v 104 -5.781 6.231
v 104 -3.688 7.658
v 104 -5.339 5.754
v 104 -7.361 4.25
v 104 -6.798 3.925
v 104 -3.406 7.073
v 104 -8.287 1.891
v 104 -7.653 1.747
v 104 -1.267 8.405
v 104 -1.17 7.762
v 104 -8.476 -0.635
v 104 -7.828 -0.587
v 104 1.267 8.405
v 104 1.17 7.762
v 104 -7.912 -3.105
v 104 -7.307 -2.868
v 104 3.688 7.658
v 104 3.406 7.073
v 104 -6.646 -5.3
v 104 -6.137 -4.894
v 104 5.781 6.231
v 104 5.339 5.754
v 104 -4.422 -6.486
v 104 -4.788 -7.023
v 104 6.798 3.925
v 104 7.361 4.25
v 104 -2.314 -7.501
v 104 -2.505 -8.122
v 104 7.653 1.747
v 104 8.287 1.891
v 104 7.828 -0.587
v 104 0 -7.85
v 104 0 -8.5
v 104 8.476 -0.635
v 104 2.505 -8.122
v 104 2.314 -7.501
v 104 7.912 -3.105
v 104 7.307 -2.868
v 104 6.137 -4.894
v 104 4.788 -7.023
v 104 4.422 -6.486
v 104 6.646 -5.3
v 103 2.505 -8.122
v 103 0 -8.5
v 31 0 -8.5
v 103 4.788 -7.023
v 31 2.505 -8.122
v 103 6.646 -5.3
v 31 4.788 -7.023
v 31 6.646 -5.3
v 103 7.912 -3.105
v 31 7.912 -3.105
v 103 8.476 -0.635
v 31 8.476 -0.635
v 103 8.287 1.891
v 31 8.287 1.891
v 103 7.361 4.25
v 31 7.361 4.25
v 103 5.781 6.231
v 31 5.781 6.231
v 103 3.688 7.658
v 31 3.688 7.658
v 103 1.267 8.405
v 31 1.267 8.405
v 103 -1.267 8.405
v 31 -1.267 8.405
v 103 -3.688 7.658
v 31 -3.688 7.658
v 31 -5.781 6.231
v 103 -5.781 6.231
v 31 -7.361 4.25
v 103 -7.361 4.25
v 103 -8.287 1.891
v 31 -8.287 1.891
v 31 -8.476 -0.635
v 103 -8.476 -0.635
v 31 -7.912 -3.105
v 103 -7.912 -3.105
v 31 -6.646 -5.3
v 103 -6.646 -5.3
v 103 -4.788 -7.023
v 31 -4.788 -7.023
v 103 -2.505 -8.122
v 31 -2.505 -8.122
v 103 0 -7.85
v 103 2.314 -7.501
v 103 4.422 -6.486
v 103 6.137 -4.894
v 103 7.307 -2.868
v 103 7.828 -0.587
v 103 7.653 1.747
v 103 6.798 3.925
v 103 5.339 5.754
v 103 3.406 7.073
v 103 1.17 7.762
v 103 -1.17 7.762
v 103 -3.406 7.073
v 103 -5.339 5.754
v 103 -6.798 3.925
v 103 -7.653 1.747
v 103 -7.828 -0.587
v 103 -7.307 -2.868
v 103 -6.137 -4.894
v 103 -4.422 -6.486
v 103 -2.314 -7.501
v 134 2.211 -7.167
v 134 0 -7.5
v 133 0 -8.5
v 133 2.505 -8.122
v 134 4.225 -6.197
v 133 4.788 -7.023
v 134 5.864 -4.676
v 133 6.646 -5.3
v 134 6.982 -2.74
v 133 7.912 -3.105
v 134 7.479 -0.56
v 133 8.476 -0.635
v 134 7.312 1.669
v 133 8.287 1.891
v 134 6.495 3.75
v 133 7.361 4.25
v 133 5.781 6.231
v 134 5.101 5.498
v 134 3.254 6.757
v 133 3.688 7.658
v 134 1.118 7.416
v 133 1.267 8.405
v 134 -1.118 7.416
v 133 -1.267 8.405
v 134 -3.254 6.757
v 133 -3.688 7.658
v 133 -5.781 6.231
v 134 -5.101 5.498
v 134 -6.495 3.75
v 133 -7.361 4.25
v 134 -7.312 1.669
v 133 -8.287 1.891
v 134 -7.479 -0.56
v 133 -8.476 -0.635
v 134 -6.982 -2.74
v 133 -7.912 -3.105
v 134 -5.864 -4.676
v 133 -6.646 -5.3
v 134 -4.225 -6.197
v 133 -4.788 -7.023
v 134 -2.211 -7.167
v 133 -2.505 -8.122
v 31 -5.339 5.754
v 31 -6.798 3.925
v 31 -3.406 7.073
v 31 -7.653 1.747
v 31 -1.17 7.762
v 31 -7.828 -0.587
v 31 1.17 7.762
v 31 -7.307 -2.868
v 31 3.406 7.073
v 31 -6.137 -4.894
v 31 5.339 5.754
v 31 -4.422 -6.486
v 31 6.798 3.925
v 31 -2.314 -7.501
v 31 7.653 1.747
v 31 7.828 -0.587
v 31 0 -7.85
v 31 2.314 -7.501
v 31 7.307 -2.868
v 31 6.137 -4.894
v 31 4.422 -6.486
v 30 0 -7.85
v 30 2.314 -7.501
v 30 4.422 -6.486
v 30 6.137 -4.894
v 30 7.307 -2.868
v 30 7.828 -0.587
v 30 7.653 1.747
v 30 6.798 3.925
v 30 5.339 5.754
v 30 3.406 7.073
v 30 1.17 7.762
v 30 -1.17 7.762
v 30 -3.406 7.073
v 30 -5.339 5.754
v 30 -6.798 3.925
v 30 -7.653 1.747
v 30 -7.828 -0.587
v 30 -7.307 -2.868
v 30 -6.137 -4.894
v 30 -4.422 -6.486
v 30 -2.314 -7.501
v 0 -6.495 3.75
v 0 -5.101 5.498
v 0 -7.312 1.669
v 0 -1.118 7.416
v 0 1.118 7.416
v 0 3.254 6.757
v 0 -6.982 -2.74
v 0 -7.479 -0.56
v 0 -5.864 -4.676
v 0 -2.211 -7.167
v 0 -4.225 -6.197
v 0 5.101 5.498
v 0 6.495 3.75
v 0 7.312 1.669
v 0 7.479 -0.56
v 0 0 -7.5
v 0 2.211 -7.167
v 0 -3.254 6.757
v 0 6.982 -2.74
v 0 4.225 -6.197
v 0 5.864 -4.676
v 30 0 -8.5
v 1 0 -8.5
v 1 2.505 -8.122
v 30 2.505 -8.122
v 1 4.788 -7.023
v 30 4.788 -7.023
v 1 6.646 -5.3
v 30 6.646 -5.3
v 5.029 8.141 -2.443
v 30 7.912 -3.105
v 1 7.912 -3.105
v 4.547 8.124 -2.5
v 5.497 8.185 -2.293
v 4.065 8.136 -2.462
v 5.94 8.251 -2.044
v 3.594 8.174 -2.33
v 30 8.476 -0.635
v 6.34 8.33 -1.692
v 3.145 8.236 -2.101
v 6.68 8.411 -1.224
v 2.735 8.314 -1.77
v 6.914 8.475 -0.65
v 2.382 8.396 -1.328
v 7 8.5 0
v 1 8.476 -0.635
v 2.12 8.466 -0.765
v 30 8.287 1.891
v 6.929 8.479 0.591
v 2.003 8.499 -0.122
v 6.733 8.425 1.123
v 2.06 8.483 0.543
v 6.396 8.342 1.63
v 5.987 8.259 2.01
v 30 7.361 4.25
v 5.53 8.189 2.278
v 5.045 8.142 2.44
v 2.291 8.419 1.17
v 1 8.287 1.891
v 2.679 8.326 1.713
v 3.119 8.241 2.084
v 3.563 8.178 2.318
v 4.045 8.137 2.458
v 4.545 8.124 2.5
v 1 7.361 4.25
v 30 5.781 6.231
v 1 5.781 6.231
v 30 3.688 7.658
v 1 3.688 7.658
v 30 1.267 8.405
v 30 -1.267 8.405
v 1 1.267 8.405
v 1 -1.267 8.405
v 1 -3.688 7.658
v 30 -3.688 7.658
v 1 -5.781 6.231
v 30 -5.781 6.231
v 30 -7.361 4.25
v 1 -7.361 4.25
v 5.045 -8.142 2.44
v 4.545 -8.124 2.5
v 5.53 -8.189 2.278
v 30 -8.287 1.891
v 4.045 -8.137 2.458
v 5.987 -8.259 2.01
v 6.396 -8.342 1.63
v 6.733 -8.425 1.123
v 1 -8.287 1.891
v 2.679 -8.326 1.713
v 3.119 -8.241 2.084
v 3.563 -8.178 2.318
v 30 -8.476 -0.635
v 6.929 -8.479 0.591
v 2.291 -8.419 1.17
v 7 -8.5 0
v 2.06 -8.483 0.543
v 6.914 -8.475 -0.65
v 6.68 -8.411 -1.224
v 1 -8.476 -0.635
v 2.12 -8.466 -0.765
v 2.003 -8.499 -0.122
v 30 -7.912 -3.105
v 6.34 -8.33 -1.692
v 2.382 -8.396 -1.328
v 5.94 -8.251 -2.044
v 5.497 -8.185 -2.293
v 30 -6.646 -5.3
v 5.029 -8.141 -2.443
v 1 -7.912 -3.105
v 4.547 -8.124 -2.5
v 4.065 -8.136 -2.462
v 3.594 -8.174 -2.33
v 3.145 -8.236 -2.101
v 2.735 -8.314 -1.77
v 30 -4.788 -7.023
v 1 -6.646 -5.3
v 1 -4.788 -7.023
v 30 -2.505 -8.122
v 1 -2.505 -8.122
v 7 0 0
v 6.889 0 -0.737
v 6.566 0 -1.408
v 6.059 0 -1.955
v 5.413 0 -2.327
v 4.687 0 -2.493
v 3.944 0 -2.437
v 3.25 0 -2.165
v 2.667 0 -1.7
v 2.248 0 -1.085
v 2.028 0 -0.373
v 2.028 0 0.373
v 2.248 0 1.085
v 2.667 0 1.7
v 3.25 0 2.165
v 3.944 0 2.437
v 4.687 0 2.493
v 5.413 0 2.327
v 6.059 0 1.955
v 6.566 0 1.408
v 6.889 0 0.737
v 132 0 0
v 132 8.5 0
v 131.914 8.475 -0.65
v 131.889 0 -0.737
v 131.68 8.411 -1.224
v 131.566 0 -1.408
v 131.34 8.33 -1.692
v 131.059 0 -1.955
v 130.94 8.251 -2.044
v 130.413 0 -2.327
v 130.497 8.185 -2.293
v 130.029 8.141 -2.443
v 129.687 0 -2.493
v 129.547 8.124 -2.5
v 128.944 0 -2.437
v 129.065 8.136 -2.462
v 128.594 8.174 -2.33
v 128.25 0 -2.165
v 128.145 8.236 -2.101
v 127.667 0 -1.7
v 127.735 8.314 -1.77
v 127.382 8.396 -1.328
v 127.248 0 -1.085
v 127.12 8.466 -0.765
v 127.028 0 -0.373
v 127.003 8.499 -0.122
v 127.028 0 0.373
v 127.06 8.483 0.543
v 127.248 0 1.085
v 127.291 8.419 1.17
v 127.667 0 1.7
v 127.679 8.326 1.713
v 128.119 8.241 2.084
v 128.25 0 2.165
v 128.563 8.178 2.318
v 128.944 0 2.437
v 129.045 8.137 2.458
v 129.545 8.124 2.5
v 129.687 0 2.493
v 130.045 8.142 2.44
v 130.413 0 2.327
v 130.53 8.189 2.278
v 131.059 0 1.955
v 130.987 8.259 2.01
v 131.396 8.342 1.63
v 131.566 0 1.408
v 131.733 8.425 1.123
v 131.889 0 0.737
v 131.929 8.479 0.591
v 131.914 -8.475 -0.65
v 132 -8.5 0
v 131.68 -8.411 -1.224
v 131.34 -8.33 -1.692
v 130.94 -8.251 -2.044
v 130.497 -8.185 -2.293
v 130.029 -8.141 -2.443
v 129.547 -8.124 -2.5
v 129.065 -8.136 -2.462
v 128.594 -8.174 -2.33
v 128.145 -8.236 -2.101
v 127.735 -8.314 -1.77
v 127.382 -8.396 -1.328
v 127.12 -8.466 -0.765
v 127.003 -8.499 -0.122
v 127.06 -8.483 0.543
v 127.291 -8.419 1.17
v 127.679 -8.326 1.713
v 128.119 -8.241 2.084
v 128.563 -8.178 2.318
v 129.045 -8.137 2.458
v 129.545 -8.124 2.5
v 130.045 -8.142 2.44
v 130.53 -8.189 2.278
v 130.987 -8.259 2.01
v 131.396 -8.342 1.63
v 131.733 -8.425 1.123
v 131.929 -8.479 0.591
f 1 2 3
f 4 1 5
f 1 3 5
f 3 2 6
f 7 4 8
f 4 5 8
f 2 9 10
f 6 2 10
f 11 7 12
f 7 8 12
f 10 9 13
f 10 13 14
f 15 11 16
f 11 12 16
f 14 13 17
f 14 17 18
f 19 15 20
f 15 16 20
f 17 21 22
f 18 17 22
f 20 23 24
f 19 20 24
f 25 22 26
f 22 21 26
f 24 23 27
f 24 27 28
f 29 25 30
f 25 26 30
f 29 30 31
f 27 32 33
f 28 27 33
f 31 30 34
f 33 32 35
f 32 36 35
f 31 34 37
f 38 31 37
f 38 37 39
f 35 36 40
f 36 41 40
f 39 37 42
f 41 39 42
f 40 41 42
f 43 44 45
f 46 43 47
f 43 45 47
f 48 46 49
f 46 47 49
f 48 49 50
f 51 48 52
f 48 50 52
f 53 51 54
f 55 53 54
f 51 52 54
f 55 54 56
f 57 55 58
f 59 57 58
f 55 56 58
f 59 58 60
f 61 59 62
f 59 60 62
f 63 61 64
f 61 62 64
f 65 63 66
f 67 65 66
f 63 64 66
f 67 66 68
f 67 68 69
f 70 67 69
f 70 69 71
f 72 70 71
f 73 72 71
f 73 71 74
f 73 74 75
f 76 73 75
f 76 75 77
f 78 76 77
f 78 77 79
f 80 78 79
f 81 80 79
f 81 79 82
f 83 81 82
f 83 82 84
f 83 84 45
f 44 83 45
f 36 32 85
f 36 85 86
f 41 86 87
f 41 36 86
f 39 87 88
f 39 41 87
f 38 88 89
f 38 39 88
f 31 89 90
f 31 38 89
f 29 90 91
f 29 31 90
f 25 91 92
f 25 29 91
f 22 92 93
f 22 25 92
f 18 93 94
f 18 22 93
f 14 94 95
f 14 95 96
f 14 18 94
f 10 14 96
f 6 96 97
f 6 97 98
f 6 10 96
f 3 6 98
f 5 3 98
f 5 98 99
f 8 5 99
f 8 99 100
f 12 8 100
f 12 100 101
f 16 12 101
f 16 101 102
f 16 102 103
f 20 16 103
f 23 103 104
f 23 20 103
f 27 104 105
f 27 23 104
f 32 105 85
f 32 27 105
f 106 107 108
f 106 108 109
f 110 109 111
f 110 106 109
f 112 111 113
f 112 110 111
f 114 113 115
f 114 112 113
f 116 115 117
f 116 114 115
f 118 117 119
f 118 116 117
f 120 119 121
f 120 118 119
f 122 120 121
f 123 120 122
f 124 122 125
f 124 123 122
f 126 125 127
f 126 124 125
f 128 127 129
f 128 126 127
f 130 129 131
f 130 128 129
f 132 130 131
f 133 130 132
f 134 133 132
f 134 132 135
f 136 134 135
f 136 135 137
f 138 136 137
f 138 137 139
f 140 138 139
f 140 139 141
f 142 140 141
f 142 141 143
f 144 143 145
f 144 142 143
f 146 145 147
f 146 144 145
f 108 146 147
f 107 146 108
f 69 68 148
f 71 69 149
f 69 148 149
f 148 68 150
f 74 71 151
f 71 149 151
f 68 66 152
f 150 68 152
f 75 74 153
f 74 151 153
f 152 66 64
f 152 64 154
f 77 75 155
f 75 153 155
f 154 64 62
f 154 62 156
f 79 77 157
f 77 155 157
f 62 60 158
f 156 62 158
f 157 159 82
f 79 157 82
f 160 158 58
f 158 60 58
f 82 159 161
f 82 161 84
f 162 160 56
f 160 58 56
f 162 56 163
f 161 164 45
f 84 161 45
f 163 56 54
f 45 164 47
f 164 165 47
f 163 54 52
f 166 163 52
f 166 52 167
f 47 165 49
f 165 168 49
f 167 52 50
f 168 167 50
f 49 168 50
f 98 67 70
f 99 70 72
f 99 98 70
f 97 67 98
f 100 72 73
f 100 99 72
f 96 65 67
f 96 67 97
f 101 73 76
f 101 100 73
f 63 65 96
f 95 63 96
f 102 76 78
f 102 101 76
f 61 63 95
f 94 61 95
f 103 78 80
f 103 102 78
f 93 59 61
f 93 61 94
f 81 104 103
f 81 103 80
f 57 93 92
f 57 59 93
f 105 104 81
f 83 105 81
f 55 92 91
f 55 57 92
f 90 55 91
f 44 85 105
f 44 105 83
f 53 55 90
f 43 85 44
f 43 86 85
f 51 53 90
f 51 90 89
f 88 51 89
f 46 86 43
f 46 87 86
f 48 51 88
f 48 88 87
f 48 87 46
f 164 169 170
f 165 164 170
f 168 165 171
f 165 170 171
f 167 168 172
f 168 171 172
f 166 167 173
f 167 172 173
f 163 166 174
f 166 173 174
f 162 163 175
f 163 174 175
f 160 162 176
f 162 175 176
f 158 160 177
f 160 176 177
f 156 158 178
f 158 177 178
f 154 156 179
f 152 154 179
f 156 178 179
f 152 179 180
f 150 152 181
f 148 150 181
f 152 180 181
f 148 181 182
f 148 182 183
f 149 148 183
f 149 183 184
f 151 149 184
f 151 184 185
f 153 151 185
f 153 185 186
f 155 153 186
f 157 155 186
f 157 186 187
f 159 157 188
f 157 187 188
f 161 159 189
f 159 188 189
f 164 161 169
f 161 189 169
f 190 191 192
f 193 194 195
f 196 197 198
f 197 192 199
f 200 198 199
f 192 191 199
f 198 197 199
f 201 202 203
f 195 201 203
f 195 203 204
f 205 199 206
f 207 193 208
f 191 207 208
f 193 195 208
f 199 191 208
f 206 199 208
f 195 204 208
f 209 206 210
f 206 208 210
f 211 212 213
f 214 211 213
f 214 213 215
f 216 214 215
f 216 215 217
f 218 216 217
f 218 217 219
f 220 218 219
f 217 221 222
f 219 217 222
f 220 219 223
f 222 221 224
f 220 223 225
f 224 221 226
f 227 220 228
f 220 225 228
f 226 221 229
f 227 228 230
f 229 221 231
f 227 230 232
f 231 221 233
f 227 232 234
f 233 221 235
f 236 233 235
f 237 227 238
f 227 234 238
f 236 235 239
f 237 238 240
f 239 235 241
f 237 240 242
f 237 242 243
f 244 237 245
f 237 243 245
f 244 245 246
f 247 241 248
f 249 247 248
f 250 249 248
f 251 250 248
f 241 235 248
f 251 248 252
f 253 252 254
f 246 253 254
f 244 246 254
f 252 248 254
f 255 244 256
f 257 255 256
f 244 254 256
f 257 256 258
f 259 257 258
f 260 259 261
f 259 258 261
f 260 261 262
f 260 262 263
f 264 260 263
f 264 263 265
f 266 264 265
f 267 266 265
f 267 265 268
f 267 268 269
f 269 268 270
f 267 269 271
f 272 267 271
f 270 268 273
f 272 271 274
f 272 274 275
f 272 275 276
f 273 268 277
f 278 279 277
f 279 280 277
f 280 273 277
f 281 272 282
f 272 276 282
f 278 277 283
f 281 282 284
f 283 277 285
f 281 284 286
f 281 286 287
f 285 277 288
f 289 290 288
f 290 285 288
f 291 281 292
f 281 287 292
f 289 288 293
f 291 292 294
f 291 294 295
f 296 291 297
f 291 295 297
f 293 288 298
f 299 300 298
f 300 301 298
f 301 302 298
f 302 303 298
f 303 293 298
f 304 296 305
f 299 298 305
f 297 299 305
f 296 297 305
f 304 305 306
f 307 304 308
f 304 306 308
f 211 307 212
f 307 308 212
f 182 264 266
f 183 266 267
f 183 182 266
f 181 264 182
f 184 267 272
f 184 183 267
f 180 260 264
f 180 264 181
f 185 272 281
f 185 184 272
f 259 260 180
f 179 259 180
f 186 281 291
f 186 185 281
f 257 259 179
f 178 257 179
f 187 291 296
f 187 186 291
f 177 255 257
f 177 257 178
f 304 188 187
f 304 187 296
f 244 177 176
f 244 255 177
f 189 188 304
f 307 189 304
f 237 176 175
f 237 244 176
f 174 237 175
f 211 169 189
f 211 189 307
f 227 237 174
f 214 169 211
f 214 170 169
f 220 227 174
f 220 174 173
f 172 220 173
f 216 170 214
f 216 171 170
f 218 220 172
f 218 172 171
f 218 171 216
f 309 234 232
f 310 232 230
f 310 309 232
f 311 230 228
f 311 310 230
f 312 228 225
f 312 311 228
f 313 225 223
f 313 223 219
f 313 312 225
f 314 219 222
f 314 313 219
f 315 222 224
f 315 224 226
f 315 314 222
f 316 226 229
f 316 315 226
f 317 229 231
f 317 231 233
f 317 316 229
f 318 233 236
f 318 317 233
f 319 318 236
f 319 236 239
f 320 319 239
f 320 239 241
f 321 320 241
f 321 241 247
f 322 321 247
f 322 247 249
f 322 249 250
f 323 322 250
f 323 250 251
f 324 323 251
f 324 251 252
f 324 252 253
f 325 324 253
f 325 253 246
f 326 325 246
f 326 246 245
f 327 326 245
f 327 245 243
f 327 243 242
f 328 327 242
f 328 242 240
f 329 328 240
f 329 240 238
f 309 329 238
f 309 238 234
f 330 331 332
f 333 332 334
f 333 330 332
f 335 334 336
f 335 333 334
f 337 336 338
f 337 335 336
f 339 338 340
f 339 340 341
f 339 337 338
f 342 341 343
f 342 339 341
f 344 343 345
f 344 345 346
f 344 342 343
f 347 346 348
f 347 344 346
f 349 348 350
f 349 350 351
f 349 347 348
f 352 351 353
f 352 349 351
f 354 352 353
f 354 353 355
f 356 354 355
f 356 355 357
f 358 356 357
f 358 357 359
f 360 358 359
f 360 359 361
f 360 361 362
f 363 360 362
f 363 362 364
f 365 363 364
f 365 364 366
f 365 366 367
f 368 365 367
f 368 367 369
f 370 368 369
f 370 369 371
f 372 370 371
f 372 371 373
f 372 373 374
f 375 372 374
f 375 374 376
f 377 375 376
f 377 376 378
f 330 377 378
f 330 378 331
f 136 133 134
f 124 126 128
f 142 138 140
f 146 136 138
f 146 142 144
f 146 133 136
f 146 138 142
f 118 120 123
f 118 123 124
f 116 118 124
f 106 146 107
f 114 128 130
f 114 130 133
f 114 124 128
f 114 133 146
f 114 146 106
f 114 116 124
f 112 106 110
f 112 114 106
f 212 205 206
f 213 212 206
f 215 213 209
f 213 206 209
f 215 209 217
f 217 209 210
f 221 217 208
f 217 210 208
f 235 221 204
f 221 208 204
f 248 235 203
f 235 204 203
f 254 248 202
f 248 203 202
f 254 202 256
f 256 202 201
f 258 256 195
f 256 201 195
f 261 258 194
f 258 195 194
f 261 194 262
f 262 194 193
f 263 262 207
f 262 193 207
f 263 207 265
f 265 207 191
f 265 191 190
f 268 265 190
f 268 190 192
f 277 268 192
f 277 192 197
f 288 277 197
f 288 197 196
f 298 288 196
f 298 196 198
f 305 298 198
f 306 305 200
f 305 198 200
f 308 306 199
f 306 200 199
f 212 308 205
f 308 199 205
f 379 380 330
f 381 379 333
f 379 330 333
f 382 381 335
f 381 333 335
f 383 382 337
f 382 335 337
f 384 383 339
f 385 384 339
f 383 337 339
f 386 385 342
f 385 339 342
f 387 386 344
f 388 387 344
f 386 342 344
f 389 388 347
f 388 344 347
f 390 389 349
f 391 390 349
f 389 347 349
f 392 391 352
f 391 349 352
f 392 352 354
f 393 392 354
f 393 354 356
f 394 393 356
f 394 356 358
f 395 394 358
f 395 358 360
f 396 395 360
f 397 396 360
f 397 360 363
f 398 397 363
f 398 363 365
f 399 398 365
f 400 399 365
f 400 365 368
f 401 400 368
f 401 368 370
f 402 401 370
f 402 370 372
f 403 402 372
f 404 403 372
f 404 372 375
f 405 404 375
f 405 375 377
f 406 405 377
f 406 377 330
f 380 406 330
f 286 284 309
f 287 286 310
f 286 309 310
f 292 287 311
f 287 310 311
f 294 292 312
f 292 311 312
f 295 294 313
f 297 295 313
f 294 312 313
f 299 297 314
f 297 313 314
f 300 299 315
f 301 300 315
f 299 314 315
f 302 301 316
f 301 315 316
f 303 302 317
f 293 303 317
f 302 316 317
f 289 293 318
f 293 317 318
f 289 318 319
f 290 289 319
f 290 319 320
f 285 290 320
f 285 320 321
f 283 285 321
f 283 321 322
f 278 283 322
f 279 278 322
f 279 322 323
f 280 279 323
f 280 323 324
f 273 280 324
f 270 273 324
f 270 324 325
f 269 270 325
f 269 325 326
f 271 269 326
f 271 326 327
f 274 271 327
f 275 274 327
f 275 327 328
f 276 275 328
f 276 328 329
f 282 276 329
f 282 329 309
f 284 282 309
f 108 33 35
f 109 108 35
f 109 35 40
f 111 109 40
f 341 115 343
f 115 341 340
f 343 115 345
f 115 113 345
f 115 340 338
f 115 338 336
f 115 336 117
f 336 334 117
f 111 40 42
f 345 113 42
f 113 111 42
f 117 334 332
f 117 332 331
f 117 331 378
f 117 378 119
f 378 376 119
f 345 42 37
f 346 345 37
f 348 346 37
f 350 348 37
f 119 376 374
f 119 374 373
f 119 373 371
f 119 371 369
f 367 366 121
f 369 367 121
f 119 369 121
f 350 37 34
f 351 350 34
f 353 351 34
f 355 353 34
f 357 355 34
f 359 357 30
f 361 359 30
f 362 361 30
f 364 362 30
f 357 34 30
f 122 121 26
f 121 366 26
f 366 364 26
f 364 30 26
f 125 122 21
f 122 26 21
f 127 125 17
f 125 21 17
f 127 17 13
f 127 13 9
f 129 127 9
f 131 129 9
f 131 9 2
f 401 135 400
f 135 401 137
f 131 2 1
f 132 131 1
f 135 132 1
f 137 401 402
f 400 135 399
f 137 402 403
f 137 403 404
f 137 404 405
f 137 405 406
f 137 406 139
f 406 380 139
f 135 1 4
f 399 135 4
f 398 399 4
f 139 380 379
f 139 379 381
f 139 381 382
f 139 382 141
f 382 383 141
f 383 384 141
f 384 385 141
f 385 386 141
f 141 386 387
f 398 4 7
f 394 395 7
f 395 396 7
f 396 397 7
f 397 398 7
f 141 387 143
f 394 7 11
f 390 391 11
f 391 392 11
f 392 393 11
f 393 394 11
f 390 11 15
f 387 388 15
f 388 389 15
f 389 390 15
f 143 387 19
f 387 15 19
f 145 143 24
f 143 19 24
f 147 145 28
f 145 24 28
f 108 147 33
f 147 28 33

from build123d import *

# Parameters (mm, degrees)
SKETCH1_R               = 8.5
BOSS_EXTRUDE1_DEPTH     = 134
CHAMFER1_SIZE           = 1
SKETCH2_R               = 2.5
CUT_EXTRUDE1_DEPTH      = 9.5
CUT_EXTRUDE1_DEPTH_BACK = 9.5
SKETCH3_R               = 8.5
SKETCH3_R_2             = 7.85
CUT_EXTRUDE2_DEPTH      = 1


with BuildPart() as part:
    # Sketch1 → Boss-Extrude1 (new body)
    with BuildSketch(Plane(origin=(0, 0, 0), x_dir=(0, 0, -1), z_dir=(1, 0, 0))):
        Circle(SKETCH1_R)
    extrude(amount=BOSS_EXTRUDE1_DEPTH)

    # Chamfer1
    chamfer1_edges = [part.edges().sort_by_distance(p)[0] for p in [
        (0, 0, 8.5),
        (134, 0, 8.5),
    ]]
    chamfer(chamfer1_edges, length=CHAMFER1_SIZE)

    # Sketch2 → Cut-Extrude1 (cut, two sides)
    with BuildSketch(Plane(origin=(0, 0, 0), x_dir=(1, 0, 0), z_dir=(0, 1, 0))) as cut_extrude1_sk:
        with Locations((4.5, 0)):
            Circle(SKETCH2_R)
        with Locations((129.5, 0)):
            Circle(SKETCH2_R)
    extrude(amount=CUT_EXTRUDE1_DEPTH, mode=Mode.SUBTRACT)
    extrude(cut_extrude1_sk.sketch, amount=-CUT_EXTRUDE1_DEPTH_BACK, mode=Mode.SUBTRACT)

    # Sketch3 → Cut-Extrude2 (cut)
    with BuildSketch(Plane(origin=(104, 0, 0), x_dir=(0, 0, -1), z_dir=(1, 0, 0))):
        Circle(SKETCH3_R)
        Circle(SKETCH3_R_2, mode=Mode.SUBTRACT)
    cut_extrude2 = extrude(amount=-CUT_EXTRUDE2_DEPTH, mode=Mode.SUBTRACT)

    # Mirror1: Cut-Extrude2 across plane
    add(cut_extrude2.mirror(Plane(origin=(67, 0, 0), x_dir=(0, 0, 1), z_dir=(1, 0, 0))), mode=Mode.SUBTRACT)


solid = part.part
